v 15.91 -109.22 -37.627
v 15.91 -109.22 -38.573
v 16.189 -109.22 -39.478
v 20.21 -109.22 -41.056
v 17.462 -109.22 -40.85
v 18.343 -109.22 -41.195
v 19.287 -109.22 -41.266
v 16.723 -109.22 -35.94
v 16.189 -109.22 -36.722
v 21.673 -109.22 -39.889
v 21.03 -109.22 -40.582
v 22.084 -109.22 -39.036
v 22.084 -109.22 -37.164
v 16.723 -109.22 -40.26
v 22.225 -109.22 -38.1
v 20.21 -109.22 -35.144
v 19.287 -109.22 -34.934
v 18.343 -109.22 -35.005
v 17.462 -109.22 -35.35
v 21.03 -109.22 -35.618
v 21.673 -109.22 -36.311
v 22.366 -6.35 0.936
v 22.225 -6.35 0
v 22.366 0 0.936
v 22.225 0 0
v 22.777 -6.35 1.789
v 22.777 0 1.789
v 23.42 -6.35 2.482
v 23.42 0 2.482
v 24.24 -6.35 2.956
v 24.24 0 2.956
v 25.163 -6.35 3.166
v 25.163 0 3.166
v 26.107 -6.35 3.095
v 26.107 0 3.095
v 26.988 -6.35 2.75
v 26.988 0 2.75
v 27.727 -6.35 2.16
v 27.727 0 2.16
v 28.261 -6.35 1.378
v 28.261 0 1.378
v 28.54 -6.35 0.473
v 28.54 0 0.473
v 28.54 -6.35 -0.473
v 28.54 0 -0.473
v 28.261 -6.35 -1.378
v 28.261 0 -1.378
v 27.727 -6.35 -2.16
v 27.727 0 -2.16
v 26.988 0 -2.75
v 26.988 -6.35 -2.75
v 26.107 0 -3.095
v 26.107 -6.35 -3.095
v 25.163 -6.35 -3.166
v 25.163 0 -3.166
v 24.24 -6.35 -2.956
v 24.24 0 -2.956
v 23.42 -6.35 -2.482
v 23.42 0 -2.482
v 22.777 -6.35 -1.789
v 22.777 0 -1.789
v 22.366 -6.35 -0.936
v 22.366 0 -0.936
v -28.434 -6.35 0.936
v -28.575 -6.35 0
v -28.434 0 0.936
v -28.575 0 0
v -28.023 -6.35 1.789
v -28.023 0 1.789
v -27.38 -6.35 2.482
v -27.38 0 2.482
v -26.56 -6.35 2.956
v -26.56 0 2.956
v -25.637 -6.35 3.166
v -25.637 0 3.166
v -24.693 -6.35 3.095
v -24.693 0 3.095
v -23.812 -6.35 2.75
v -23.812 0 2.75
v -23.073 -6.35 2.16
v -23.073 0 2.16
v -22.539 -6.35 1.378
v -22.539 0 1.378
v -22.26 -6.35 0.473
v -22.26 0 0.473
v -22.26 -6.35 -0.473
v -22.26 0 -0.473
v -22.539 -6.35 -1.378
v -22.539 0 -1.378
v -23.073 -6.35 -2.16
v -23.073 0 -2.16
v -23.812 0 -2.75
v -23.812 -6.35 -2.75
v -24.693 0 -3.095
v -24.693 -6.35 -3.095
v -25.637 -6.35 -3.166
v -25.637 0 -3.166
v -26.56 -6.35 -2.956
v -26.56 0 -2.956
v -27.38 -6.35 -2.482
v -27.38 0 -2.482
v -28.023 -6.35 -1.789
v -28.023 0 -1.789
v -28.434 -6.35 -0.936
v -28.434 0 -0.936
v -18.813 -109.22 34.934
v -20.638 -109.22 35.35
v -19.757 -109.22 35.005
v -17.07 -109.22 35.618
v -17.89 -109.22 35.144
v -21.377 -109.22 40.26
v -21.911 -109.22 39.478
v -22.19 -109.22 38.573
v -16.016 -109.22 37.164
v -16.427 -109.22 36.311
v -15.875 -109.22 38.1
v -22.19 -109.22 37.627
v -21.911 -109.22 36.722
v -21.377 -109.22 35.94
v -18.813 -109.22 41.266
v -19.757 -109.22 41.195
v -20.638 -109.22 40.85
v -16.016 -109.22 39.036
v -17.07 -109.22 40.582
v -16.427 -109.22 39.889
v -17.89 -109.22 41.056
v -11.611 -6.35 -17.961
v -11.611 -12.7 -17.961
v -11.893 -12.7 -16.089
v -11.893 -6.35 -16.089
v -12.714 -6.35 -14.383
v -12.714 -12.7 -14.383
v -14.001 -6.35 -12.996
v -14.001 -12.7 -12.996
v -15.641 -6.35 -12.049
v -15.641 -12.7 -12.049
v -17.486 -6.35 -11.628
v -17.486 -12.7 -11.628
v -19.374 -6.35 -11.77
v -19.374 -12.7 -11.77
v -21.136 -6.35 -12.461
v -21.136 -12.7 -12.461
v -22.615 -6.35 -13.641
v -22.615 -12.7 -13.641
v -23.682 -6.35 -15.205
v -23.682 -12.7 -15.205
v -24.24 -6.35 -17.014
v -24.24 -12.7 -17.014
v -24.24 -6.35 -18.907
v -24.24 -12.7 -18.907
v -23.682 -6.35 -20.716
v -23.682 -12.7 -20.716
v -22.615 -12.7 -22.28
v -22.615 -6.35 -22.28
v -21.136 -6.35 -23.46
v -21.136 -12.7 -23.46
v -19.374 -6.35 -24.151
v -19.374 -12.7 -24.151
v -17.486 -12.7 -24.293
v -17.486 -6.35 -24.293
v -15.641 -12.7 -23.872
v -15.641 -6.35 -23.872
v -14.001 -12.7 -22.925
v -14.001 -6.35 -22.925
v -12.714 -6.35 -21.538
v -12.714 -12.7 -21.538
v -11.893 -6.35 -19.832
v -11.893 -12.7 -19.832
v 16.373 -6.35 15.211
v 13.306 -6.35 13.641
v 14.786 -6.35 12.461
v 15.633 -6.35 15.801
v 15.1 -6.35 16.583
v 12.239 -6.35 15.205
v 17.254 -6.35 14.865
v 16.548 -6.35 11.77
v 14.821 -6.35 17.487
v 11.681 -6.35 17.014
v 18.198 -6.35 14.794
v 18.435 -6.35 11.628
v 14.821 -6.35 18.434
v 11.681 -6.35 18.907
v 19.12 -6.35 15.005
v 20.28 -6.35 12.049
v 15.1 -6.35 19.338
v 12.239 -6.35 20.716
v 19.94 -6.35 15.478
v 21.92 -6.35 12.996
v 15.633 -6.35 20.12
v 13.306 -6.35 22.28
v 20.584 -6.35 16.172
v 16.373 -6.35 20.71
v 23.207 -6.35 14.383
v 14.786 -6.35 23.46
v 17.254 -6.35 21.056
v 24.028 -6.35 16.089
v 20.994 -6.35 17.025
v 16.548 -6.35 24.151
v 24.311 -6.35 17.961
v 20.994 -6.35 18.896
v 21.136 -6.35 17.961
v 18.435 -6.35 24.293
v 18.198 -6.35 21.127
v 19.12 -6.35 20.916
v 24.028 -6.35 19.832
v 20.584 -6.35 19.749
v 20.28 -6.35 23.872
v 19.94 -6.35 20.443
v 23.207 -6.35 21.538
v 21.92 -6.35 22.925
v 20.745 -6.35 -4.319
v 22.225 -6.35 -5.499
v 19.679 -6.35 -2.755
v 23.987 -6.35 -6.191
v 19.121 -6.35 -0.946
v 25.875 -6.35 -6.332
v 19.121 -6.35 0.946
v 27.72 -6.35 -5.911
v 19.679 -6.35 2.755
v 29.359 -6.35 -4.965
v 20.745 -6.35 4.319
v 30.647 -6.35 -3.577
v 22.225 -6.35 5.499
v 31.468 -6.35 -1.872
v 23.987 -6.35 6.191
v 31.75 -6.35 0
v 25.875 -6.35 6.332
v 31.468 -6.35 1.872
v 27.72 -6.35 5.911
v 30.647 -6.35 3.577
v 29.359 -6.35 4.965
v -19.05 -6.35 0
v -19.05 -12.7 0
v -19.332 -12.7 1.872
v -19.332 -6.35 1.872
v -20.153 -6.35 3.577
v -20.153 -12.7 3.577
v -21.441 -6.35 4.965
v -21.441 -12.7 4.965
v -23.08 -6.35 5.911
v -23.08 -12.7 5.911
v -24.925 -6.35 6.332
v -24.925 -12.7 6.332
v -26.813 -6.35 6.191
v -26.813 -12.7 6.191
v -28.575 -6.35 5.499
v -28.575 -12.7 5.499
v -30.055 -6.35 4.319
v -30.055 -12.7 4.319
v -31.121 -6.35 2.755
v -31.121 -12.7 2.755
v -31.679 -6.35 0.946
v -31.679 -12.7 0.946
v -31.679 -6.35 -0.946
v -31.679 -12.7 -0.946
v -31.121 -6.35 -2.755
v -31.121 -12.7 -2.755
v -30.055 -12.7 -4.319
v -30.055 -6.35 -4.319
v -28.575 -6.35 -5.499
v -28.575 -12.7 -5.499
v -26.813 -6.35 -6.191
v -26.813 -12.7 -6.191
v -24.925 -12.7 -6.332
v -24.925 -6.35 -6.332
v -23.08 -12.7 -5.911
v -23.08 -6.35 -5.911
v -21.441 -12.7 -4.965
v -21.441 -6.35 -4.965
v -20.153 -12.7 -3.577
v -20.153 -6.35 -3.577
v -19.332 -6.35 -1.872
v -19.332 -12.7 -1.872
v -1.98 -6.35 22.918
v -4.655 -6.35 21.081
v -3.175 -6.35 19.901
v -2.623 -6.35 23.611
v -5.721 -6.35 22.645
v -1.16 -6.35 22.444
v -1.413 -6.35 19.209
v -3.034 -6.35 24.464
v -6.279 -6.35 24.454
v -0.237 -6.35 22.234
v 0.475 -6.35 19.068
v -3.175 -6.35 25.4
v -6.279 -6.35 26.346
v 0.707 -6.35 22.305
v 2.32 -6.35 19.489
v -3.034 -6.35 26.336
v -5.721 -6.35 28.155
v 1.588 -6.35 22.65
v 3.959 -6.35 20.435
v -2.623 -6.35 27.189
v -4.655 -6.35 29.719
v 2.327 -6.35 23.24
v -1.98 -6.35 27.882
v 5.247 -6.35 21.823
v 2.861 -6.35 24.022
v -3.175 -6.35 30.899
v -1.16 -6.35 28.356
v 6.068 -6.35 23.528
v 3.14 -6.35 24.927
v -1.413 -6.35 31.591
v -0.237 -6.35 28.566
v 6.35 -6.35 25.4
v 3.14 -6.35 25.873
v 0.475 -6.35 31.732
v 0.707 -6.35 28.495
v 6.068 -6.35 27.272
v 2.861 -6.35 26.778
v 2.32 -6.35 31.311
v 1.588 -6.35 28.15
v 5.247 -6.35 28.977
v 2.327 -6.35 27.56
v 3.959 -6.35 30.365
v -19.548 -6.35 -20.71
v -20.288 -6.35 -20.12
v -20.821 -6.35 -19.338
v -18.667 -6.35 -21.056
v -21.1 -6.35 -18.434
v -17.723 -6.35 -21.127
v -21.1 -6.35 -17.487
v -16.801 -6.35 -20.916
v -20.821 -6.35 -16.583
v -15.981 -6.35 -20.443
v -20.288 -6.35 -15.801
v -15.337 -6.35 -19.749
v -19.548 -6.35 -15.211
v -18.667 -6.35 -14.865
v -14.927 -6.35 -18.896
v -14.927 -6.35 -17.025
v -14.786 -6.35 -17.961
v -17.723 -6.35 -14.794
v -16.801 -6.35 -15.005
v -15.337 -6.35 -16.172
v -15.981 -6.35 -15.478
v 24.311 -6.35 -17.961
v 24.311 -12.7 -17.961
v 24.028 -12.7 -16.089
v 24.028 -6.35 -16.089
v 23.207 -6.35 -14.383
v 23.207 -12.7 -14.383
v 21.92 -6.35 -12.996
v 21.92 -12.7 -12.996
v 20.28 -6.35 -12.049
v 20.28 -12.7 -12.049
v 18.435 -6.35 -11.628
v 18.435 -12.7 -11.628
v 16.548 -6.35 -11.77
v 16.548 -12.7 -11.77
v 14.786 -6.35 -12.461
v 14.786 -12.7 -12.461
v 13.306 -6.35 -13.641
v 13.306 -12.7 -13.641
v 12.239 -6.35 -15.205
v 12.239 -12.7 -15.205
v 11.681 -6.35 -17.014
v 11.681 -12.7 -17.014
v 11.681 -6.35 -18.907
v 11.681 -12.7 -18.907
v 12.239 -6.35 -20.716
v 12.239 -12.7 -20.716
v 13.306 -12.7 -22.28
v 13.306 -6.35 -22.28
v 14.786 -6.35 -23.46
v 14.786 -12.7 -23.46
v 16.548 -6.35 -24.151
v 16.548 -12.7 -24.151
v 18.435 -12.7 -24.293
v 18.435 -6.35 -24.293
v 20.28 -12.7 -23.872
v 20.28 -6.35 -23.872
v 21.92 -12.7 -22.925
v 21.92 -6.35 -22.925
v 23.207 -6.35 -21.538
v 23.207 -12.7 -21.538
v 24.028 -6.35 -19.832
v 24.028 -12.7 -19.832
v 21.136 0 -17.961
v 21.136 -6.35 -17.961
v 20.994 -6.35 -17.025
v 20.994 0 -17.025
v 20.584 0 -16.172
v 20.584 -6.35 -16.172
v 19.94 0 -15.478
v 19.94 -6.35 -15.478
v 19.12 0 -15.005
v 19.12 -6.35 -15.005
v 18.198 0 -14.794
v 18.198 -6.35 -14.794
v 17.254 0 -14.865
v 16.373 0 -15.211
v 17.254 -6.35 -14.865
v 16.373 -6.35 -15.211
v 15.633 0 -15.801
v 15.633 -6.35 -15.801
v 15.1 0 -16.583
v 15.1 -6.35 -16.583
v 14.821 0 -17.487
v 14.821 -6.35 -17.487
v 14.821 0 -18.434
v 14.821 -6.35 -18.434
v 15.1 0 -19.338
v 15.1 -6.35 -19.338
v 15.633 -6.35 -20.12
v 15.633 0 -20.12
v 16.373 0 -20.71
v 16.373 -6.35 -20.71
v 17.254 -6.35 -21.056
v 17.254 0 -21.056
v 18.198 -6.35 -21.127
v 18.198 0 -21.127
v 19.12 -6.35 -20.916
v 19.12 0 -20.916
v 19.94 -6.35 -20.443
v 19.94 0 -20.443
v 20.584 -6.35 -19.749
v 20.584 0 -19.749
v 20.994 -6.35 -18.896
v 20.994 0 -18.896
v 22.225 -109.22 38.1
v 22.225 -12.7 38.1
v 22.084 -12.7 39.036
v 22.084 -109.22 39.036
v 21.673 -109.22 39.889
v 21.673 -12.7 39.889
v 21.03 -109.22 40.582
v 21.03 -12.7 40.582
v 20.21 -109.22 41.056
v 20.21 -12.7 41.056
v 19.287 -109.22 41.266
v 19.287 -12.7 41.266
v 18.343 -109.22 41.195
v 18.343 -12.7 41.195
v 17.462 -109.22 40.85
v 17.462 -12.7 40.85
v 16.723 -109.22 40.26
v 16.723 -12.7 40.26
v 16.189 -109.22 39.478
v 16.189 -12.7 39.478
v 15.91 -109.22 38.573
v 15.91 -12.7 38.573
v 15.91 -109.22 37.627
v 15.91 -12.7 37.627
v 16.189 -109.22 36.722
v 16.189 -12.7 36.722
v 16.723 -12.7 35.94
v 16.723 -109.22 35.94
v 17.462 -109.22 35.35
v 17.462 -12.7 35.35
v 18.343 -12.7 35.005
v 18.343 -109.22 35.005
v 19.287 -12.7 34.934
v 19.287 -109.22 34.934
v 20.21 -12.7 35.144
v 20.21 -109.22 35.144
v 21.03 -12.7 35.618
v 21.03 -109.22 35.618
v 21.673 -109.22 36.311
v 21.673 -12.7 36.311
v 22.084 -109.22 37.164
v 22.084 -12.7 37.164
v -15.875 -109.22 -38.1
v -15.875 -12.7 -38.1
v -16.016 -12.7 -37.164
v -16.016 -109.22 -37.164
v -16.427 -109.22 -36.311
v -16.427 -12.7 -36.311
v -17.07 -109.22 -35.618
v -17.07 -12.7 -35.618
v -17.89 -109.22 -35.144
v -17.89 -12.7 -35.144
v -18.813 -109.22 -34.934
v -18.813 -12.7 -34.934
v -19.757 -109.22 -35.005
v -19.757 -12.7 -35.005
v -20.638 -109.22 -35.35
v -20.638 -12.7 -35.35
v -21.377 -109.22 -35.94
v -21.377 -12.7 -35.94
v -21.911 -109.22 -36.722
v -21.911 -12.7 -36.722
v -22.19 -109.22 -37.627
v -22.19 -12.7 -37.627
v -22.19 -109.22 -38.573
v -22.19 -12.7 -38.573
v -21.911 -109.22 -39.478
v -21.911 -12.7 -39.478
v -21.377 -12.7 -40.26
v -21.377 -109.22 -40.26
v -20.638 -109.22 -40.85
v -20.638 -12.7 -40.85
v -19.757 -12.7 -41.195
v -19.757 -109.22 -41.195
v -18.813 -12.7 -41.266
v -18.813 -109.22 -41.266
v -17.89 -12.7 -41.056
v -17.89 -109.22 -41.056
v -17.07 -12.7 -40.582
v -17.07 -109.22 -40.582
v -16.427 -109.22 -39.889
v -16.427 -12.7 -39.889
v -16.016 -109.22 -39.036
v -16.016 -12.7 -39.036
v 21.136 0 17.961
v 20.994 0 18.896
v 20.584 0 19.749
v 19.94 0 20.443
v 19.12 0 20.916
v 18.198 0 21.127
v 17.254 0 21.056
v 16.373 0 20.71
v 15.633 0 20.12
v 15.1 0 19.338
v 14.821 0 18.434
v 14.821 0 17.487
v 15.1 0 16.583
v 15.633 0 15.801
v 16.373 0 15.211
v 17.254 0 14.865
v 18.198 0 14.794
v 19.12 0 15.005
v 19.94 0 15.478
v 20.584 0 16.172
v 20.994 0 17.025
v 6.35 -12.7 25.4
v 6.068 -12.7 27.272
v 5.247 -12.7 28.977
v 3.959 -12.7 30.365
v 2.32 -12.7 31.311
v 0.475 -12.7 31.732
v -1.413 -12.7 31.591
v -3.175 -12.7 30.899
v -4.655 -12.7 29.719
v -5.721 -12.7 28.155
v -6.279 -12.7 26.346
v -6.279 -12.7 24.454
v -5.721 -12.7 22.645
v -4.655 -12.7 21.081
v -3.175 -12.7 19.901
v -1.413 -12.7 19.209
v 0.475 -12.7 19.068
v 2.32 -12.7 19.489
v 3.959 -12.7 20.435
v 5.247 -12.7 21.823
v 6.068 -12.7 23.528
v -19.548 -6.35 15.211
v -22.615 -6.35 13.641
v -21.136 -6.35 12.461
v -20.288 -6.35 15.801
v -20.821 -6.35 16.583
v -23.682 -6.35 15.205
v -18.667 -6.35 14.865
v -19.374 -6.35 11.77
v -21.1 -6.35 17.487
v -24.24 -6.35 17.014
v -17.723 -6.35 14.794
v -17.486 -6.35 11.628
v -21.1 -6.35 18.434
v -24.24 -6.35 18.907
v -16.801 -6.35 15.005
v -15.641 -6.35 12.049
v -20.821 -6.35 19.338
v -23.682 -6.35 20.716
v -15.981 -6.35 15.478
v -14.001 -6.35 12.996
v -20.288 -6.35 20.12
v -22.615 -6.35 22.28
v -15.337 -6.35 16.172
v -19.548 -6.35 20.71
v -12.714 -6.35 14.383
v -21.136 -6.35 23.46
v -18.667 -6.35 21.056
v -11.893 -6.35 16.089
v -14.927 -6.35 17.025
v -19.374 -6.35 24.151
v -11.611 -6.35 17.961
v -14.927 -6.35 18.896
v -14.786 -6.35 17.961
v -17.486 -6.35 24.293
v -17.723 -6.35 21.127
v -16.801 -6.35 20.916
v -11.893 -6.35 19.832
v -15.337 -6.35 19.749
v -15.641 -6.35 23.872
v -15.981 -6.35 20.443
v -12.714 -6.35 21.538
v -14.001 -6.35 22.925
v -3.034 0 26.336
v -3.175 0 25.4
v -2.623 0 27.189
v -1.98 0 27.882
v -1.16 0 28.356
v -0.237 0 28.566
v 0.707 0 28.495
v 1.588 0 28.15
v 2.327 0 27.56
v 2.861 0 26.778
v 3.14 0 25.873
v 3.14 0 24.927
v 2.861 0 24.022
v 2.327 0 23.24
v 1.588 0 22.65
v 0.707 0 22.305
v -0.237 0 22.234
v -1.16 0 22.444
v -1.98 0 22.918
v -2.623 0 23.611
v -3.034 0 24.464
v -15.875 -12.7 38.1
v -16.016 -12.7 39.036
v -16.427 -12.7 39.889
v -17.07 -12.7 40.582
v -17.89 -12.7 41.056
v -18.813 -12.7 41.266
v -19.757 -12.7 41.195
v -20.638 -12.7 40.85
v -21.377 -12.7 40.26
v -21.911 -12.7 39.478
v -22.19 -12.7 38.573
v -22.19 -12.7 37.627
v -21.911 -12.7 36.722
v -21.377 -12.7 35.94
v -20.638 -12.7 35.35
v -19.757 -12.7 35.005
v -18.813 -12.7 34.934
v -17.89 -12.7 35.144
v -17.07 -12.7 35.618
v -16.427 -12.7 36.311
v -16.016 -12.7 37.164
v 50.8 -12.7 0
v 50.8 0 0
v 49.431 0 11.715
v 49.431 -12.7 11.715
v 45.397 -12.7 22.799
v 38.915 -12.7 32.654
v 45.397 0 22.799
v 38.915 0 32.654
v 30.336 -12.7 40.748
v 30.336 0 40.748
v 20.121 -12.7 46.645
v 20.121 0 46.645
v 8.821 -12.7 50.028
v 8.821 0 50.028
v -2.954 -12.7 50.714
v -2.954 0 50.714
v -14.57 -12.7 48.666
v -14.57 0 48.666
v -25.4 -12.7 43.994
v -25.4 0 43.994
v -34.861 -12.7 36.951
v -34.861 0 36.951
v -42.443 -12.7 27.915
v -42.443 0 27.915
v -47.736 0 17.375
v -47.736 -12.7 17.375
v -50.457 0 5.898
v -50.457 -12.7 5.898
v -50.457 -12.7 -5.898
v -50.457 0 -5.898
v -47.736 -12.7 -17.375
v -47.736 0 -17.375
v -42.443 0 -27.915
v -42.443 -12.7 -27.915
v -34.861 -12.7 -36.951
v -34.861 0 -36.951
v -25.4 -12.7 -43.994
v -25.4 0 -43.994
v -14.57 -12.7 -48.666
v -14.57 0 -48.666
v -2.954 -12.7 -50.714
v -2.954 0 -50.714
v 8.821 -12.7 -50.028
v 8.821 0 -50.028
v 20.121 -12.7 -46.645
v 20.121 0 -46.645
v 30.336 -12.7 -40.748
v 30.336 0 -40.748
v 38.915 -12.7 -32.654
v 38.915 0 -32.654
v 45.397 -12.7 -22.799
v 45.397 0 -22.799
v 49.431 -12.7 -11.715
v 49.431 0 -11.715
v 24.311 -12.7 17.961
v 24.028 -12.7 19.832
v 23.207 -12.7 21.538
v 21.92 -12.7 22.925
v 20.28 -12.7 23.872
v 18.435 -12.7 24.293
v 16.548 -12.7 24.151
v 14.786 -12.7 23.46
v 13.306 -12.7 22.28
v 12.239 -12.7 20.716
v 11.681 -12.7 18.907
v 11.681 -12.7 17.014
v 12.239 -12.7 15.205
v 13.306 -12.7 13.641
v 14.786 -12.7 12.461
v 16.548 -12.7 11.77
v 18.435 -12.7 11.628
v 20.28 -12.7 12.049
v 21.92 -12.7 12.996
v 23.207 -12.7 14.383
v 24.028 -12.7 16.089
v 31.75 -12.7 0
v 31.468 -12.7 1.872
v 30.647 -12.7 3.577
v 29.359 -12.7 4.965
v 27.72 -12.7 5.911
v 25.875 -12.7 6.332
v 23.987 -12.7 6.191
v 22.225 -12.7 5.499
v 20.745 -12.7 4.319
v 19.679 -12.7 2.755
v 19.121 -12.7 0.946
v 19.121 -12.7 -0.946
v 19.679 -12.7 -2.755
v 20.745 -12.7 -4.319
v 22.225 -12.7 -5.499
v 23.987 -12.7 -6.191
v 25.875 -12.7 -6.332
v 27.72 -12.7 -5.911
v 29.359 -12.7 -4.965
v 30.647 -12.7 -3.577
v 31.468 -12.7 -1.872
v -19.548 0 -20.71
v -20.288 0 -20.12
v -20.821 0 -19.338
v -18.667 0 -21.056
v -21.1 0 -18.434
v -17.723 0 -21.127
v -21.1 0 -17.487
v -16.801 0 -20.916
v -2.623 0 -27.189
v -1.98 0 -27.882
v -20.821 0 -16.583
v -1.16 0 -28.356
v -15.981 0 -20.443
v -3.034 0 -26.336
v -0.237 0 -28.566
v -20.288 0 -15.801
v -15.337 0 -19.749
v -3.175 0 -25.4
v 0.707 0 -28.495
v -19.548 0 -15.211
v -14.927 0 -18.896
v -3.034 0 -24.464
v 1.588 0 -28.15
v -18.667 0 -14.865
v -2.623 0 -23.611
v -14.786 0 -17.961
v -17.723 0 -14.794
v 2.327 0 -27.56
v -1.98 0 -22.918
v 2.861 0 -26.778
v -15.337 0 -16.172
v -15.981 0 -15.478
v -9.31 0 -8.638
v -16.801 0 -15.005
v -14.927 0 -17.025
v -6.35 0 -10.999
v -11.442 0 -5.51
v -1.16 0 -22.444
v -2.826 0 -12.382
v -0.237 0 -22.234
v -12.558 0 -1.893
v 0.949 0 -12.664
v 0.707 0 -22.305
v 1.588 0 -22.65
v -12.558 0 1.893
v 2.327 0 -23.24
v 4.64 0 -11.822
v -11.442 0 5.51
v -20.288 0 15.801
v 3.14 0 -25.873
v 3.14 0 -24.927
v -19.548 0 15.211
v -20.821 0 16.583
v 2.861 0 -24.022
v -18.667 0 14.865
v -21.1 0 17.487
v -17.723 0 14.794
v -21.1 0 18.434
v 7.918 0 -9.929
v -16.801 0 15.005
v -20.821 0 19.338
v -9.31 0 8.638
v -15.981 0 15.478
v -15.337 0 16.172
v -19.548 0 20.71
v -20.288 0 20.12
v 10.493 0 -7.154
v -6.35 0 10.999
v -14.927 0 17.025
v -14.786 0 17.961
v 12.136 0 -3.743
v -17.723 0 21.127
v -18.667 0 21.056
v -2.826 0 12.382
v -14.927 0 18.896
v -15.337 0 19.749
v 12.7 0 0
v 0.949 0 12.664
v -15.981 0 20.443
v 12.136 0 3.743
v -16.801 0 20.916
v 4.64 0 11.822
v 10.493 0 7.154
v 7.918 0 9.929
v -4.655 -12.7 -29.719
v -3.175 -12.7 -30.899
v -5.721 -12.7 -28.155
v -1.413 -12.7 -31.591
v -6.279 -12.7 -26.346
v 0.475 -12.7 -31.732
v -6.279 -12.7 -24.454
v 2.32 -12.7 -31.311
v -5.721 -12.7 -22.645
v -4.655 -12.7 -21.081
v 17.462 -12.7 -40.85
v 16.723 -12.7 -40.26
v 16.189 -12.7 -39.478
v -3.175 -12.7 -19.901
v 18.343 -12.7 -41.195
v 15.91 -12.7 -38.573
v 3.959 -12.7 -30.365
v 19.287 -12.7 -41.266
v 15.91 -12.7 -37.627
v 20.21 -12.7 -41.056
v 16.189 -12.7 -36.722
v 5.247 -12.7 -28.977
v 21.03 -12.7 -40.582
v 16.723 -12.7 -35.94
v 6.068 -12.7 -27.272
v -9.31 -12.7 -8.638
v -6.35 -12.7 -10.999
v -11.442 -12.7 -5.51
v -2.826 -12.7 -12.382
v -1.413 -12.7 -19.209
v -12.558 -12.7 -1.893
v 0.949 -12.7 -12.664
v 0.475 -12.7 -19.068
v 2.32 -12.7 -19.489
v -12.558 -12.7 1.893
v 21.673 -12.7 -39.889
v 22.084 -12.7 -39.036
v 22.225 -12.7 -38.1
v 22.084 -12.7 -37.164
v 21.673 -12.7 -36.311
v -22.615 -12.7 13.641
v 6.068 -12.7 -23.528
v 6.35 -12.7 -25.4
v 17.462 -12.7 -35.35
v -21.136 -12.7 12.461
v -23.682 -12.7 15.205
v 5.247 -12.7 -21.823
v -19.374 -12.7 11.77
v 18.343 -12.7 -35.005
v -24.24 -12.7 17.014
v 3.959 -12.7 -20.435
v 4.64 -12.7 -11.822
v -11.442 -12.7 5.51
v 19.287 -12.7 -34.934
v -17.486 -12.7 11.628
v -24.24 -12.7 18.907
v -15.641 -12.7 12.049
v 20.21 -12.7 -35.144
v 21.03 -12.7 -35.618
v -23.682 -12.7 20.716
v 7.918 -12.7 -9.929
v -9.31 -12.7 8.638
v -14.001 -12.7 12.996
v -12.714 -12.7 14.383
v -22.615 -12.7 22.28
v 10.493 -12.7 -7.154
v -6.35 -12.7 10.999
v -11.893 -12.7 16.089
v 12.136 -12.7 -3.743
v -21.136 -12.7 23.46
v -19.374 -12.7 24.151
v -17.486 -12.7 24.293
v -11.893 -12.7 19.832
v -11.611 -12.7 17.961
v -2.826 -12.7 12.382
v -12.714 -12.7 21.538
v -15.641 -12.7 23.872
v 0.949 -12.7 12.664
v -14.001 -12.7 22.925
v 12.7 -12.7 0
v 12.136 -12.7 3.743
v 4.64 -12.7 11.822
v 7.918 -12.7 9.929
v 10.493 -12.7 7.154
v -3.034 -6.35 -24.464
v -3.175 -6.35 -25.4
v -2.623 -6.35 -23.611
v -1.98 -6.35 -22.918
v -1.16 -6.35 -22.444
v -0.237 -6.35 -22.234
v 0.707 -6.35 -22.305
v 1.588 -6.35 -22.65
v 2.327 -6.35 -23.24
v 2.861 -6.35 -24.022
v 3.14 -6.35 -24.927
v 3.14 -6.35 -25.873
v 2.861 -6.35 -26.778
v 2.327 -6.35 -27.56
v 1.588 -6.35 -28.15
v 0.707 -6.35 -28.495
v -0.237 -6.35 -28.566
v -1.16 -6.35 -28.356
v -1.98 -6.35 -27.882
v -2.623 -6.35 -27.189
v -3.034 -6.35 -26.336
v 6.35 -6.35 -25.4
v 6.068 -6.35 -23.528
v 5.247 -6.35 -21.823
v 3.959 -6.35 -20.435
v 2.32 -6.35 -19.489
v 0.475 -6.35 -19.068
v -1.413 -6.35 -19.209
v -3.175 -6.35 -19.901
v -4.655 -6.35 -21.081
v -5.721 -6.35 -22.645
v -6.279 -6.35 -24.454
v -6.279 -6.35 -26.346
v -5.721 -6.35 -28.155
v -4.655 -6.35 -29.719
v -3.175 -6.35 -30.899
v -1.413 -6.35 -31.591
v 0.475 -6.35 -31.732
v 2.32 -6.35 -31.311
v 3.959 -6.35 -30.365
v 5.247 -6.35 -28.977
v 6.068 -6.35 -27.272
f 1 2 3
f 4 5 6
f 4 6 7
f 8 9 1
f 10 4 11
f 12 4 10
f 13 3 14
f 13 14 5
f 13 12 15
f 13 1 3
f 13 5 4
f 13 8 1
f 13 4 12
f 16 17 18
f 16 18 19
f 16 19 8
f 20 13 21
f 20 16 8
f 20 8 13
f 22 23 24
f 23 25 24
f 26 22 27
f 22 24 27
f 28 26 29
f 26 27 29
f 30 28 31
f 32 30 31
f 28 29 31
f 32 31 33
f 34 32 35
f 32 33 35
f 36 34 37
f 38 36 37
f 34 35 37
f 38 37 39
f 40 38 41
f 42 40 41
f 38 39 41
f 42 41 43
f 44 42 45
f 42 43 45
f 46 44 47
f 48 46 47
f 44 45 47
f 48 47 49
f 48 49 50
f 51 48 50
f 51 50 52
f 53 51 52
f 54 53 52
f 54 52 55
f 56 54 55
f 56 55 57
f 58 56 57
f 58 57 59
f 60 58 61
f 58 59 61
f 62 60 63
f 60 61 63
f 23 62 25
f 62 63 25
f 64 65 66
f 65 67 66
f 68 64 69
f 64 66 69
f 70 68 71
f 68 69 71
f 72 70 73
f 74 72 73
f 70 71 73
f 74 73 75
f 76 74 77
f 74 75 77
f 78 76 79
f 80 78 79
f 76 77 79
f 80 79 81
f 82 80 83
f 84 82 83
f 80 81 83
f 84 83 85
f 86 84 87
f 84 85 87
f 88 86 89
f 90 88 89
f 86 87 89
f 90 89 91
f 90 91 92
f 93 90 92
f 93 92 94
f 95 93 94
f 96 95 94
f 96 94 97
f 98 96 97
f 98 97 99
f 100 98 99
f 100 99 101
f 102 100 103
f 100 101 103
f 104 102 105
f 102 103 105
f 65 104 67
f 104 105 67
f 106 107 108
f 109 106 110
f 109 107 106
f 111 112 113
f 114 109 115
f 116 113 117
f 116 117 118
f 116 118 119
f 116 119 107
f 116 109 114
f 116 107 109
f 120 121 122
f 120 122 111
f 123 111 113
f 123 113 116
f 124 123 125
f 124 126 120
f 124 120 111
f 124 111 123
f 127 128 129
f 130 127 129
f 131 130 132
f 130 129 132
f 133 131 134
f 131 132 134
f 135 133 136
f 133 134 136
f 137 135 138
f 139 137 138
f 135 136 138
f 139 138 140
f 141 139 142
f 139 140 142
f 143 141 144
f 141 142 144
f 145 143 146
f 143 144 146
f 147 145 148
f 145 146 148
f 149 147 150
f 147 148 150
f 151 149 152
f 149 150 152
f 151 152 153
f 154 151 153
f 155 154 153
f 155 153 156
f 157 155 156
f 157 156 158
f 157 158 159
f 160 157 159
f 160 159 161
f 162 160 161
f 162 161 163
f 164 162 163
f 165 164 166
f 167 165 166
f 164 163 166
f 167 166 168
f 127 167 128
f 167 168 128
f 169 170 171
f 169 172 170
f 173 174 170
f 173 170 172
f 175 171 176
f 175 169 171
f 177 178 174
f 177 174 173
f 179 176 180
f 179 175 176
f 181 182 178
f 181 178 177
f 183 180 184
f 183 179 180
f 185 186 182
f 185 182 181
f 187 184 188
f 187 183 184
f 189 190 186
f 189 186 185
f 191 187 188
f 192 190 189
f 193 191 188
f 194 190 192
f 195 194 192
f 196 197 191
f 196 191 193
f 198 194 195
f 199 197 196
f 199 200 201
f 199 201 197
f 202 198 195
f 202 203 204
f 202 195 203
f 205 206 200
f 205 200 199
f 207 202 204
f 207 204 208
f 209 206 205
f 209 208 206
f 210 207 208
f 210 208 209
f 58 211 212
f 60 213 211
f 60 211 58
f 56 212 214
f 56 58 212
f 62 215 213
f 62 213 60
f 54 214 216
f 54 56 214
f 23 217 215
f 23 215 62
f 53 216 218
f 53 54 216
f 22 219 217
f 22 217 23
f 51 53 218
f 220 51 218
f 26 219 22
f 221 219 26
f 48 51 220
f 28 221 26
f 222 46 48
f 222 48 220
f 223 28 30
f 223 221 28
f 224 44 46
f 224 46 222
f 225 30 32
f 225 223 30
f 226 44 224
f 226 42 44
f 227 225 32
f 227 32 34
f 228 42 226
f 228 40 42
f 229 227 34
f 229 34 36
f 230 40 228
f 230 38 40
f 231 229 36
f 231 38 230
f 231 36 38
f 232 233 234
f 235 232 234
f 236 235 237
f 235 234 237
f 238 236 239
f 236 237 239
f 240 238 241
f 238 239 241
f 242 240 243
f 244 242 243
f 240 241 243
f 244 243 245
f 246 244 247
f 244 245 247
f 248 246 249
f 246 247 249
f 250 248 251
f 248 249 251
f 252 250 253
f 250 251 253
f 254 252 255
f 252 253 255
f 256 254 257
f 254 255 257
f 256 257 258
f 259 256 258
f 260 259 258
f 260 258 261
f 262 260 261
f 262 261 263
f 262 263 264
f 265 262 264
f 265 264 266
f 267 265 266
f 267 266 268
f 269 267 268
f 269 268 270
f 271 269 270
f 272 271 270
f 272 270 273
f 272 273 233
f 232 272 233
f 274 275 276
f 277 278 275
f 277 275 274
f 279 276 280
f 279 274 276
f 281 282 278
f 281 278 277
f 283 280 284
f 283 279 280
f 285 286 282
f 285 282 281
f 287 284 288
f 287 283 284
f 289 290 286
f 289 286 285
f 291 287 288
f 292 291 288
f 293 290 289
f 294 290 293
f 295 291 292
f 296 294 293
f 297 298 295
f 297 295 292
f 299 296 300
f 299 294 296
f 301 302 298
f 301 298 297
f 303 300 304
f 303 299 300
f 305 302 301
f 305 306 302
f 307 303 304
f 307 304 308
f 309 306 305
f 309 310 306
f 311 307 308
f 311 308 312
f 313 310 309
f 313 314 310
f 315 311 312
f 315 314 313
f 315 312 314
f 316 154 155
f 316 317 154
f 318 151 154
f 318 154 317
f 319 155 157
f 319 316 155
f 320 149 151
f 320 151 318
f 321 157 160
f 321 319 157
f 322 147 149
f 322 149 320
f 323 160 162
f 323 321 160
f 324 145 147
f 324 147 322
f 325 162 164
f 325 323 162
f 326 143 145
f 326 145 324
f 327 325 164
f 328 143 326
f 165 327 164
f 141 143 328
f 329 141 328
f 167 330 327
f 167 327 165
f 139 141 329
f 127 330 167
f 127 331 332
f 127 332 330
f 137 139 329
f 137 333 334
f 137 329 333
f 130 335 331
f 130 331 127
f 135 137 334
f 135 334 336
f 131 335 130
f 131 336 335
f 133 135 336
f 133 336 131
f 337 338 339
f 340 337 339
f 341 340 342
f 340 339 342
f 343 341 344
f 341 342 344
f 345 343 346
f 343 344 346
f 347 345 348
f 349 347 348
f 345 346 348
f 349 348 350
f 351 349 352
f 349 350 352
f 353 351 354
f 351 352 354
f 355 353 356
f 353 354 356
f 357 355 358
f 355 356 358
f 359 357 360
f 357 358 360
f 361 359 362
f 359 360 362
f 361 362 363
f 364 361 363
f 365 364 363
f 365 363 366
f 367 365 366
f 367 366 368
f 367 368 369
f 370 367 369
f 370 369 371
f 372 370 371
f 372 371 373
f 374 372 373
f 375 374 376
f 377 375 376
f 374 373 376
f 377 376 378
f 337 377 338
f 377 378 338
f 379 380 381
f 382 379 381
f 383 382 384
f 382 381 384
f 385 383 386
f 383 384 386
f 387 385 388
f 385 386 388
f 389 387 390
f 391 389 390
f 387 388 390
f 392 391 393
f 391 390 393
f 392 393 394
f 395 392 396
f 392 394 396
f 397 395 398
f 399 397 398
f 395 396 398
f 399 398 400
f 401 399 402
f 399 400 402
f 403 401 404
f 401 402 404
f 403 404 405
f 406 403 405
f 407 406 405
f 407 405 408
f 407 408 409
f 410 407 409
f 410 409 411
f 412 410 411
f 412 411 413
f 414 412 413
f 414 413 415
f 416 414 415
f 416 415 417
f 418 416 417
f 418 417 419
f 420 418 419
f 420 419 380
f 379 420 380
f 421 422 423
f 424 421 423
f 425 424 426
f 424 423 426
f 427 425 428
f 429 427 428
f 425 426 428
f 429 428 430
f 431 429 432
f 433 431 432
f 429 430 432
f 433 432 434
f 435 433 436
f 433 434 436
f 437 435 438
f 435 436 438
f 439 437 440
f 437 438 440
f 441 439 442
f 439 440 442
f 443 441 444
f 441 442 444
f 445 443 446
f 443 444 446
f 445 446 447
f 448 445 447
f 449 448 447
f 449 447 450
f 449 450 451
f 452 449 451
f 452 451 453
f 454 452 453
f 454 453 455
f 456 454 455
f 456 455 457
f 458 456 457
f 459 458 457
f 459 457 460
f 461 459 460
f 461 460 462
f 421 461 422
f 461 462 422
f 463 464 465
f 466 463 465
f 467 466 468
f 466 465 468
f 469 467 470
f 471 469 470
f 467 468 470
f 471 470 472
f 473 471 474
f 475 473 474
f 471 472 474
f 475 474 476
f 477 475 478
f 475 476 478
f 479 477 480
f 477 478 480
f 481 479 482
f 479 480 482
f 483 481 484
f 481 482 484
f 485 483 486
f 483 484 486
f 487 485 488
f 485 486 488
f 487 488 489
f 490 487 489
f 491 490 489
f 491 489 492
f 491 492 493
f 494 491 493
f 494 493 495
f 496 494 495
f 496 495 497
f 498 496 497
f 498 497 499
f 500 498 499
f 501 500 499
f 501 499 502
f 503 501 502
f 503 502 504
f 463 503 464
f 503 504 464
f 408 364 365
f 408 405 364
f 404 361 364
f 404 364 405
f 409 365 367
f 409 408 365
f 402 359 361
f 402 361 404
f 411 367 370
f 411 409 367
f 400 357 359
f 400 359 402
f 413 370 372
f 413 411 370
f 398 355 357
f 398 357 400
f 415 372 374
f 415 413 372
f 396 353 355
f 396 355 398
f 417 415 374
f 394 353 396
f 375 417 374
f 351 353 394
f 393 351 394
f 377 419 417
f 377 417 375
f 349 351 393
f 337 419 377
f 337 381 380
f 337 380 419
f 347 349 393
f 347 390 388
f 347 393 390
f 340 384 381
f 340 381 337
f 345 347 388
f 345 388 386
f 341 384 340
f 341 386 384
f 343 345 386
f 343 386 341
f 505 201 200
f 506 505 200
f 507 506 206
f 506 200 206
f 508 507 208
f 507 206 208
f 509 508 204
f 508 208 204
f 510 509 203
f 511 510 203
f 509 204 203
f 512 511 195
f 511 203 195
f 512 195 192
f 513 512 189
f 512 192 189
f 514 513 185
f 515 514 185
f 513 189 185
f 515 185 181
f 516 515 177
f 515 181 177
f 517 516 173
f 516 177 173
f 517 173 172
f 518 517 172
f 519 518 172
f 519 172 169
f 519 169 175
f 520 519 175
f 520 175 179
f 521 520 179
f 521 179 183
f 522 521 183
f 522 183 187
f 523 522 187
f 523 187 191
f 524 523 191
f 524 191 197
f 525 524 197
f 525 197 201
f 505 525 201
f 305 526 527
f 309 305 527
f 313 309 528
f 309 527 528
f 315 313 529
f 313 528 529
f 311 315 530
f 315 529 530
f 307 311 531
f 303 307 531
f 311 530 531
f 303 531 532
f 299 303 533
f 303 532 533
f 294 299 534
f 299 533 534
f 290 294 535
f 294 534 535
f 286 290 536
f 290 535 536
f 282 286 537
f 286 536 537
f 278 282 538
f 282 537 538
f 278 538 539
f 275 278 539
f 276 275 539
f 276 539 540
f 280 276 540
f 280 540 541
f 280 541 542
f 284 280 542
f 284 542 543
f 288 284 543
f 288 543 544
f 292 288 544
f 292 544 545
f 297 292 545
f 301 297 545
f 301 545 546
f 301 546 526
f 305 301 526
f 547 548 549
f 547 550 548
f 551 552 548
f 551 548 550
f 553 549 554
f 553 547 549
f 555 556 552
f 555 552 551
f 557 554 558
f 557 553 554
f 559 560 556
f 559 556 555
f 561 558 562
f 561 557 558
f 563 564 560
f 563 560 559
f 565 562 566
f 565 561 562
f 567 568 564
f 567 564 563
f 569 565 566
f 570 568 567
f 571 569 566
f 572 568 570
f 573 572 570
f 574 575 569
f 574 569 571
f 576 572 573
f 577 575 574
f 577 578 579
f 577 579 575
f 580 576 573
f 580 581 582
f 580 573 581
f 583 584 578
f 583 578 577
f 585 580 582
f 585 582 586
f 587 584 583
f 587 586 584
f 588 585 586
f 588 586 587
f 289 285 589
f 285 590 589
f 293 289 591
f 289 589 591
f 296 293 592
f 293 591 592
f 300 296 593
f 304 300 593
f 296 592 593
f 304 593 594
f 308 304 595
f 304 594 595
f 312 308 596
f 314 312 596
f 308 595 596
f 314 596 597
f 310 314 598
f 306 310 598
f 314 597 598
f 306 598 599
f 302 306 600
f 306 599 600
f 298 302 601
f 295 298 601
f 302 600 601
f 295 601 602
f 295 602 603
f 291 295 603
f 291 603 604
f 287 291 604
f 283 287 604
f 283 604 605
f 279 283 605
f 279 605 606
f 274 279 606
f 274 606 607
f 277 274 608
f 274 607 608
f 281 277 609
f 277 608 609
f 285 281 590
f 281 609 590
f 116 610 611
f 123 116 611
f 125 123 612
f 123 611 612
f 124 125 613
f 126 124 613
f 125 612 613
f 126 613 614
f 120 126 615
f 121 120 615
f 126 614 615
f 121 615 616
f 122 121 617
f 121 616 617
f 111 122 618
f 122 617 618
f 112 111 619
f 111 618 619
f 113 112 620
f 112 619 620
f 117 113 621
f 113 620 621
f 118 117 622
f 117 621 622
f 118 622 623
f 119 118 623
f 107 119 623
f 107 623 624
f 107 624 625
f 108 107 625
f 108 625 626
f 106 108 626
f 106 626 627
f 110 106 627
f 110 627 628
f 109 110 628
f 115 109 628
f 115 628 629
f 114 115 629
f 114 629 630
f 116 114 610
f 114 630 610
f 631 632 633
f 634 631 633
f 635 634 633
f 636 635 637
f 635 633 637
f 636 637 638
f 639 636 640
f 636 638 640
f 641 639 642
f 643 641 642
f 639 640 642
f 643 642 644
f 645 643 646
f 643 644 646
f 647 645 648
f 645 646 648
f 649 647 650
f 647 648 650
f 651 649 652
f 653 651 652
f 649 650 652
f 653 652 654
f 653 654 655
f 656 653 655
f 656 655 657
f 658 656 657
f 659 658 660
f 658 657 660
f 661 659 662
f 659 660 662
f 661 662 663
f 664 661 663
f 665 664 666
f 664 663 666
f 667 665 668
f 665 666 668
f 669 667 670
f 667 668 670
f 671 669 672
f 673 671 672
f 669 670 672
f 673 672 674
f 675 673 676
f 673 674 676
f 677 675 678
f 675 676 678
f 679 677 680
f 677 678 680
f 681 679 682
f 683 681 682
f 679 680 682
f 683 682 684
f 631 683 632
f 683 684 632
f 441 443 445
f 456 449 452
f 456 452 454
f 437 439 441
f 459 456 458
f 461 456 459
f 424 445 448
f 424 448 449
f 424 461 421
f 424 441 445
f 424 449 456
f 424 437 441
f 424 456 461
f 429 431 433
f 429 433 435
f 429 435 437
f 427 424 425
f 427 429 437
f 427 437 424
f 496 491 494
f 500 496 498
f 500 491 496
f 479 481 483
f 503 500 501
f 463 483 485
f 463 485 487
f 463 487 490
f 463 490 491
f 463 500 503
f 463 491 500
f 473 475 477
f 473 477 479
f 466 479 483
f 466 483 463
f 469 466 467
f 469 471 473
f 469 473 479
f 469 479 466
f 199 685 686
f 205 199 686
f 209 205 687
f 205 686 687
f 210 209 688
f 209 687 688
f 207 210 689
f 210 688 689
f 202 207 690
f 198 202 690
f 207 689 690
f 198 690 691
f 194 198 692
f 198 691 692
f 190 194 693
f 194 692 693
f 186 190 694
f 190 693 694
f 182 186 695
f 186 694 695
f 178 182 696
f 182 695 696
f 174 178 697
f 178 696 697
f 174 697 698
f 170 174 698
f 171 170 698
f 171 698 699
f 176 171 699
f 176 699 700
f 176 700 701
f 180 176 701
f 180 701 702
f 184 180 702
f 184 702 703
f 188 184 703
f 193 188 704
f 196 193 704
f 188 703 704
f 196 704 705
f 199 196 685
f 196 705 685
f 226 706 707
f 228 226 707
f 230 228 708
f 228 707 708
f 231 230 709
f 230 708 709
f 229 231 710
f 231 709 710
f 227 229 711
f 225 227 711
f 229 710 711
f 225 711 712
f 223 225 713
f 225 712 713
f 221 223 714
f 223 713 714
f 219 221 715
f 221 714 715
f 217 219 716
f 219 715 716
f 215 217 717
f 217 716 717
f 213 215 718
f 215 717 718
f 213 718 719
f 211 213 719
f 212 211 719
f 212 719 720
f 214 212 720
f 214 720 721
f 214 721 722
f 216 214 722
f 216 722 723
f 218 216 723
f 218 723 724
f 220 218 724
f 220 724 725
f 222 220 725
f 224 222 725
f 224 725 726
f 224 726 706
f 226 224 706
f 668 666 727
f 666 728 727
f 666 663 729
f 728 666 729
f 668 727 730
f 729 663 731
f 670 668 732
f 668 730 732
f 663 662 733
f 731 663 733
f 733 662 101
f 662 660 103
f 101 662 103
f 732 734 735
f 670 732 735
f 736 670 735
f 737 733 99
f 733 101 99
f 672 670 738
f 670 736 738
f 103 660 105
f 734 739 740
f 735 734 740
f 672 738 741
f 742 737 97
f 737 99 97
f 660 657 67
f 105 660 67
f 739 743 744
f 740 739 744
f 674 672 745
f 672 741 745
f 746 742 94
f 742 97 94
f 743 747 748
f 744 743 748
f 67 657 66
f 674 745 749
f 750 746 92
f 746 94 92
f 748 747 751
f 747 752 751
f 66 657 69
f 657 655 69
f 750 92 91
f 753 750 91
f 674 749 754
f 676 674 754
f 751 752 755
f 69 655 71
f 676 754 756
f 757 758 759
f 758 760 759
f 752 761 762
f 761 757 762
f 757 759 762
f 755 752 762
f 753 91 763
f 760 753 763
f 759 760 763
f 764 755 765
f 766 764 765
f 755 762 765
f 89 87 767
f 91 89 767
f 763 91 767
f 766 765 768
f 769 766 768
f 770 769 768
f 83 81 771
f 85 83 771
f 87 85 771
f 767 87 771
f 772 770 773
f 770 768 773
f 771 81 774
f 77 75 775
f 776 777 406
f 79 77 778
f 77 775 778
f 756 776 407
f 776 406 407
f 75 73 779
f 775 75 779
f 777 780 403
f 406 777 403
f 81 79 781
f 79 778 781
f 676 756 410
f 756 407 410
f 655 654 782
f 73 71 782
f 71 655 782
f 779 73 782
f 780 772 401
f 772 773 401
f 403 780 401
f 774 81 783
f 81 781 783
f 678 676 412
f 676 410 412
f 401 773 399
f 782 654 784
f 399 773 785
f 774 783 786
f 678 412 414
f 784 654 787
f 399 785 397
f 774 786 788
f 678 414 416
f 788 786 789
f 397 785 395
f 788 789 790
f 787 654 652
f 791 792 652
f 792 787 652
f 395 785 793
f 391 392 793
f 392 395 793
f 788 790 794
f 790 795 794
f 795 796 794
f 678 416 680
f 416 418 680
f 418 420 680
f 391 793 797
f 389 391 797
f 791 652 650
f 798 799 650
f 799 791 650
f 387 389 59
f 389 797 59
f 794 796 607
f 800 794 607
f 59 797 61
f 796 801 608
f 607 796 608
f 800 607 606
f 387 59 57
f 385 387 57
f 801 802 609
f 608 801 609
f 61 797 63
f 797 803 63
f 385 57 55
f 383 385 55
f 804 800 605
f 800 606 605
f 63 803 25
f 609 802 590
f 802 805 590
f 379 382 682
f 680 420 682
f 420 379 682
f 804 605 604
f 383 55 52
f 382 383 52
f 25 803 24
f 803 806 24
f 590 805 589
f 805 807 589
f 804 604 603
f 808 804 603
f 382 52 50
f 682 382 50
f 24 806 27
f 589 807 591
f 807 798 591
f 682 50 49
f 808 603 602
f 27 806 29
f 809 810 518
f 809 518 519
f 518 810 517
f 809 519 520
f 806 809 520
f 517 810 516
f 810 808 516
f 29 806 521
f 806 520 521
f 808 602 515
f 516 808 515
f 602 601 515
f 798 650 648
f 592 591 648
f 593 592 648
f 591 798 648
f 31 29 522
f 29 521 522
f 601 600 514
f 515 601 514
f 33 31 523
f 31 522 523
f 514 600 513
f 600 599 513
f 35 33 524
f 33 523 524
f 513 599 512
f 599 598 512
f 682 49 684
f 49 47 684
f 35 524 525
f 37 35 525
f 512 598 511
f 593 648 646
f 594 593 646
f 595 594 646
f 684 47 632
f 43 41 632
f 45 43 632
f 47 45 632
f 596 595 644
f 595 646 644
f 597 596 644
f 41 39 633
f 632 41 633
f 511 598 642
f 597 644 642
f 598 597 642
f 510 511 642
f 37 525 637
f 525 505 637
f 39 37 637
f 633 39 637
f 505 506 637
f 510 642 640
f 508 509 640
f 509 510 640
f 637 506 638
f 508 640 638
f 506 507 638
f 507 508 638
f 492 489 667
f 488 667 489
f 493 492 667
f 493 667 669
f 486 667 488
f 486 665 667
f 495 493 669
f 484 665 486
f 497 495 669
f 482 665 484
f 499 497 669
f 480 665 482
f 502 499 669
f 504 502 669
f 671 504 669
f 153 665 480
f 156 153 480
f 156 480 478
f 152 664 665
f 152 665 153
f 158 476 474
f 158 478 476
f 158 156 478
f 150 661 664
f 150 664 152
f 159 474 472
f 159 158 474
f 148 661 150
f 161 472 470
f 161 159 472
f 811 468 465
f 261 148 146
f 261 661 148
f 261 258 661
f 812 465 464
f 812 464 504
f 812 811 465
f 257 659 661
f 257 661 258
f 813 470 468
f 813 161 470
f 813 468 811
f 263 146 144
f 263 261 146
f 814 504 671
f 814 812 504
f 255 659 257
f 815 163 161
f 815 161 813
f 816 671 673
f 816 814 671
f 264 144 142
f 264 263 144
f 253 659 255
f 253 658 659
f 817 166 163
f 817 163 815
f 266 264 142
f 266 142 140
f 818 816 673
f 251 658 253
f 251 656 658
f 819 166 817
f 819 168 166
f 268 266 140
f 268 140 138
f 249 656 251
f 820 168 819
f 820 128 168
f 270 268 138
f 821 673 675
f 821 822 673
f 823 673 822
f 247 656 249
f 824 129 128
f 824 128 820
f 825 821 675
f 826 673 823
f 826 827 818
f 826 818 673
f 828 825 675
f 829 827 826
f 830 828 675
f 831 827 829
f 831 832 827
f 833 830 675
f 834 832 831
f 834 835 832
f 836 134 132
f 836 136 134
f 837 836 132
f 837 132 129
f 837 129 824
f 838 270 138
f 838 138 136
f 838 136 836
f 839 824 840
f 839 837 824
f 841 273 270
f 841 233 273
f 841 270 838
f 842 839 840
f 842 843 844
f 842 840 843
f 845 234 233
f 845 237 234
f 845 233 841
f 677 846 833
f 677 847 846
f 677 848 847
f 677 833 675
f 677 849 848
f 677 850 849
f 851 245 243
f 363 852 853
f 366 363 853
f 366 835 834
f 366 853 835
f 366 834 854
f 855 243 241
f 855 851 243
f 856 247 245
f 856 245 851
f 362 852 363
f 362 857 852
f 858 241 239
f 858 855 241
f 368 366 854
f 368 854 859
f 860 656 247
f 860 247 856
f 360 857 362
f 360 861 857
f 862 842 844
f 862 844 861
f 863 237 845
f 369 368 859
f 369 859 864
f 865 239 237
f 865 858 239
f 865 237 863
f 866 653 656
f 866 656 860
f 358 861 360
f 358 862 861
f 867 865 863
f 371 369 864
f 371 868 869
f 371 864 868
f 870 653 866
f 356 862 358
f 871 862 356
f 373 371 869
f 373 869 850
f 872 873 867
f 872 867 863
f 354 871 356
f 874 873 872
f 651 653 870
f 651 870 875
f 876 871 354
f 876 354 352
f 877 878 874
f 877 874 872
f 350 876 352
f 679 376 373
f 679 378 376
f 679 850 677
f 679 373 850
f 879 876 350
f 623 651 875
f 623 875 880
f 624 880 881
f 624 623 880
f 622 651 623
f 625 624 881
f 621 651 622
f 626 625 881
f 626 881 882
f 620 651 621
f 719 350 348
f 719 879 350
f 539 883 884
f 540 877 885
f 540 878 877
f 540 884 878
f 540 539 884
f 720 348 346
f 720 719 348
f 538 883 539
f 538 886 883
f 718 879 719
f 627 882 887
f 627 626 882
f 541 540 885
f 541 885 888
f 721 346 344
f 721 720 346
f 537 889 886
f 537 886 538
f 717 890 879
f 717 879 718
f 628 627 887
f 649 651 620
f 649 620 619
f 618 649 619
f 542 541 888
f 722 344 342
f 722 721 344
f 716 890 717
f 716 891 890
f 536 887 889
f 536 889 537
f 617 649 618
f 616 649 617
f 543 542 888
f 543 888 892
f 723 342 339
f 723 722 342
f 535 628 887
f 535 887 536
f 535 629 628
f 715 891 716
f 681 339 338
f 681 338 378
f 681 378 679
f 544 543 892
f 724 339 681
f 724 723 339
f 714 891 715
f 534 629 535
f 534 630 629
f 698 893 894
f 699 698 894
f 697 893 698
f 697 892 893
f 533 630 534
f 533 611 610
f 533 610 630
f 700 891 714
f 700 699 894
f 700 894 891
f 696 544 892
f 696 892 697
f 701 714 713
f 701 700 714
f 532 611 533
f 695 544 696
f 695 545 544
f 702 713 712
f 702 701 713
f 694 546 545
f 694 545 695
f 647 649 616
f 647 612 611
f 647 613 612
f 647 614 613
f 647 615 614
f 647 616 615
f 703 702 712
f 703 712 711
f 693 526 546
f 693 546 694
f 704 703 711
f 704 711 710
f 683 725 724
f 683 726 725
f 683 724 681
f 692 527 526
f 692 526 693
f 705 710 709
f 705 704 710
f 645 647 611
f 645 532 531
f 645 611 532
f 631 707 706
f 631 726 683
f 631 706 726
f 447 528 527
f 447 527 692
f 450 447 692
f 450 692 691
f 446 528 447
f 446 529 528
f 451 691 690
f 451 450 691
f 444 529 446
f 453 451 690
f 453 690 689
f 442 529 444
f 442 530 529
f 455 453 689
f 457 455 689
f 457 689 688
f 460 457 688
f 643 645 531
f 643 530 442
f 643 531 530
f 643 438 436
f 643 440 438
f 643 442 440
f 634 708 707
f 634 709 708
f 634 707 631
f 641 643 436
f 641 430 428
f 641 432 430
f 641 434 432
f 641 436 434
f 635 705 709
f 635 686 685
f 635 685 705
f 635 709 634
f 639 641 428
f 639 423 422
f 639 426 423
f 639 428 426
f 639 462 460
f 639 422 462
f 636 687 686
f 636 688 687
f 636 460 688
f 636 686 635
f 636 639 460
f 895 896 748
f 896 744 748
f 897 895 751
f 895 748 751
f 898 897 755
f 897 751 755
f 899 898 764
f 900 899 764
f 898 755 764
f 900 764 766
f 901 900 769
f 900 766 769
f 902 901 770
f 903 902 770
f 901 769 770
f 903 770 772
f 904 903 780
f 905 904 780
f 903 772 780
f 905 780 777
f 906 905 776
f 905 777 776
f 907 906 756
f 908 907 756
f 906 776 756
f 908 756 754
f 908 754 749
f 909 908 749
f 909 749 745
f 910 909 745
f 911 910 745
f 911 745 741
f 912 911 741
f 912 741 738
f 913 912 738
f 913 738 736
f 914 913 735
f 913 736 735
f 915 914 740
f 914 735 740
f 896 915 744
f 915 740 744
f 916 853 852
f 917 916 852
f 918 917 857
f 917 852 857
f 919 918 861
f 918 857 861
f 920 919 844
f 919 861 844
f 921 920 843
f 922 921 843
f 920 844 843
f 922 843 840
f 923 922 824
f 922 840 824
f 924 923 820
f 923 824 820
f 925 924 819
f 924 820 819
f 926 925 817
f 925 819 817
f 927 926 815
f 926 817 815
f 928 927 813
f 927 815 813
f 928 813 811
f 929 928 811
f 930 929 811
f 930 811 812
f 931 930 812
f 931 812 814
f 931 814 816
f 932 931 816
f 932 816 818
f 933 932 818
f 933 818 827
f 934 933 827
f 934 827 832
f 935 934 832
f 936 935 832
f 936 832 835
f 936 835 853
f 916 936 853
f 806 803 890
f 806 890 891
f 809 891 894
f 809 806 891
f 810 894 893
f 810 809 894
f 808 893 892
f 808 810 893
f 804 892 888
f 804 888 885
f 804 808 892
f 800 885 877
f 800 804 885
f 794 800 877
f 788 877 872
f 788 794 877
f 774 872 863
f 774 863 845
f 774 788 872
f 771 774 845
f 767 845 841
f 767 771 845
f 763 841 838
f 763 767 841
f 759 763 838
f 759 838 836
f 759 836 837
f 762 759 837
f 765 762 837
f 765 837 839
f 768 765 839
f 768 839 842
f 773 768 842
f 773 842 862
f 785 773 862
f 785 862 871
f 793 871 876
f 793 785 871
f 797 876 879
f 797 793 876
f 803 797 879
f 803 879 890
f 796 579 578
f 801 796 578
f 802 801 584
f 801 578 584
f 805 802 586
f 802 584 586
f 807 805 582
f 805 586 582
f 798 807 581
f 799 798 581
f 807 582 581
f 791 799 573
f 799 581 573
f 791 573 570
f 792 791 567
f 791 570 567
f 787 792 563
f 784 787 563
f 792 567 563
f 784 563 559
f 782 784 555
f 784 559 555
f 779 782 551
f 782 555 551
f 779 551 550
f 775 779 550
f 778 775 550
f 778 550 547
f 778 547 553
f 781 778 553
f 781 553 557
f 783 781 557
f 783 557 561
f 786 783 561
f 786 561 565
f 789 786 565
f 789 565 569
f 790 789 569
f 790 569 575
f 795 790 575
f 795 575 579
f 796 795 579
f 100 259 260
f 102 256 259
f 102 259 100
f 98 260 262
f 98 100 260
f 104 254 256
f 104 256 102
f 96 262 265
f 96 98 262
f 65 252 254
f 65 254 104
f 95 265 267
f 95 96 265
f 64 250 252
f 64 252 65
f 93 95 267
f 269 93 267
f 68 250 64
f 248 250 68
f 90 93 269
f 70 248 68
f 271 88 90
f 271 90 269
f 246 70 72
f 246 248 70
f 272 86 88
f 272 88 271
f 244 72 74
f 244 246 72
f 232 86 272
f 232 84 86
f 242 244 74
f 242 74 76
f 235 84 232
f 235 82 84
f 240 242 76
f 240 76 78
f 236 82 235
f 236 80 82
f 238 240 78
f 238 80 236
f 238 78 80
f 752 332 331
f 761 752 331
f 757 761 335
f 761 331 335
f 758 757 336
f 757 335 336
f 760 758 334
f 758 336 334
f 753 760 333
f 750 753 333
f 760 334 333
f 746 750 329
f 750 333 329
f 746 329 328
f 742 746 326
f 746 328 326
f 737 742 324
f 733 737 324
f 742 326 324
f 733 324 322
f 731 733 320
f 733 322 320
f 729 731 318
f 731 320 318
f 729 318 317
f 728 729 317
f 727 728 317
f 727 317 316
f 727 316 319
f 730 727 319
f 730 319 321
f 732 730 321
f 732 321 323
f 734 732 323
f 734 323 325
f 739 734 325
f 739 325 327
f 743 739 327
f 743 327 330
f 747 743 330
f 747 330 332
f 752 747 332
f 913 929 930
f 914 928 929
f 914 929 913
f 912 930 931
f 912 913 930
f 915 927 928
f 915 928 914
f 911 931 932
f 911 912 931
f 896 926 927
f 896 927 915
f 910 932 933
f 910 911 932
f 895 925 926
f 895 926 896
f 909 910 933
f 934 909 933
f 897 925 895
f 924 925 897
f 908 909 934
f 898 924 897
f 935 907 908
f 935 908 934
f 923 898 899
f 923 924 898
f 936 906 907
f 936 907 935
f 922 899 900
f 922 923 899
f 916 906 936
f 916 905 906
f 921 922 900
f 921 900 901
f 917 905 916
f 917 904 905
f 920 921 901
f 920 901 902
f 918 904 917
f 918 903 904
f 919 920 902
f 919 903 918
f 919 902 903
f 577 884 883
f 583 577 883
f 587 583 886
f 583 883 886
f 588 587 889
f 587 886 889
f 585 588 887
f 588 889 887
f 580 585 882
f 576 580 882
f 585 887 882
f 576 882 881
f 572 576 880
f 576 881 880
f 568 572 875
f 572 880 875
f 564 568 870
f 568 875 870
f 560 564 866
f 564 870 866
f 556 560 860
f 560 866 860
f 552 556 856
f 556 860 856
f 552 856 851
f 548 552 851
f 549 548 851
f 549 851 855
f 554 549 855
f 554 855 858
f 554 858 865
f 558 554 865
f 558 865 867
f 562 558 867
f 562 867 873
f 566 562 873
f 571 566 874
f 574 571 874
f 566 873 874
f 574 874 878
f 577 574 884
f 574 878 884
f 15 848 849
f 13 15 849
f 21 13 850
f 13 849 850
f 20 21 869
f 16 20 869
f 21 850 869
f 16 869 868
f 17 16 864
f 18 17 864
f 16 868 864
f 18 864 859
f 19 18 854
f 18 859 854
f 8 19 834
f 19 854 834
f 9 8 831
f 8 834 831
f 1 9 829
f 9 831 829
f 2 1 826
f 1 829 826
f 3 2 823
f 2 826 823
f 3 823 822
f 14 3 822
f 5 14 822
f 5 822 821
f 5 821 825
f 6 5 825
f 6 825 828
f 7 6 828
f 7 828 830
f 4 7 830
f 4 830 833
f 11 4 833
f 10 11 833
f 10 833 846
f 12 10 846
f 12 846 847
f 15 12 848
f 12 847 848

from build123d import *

# Parameters (mm, degrees)
F0_R           = 50.8
F0_R_2         = 12.7
F1_DEPTH       = 12.7
F2_R           = 6.35
F3_DEPTH       = 6.35
F4_D           = 6.35
F4_CBORE_D     = 12.7
F4_CBORE_DEPTH = 6.35
F5_R           = 3.175
F6_DEPTH       = 96.52
F7_R           = 3.175
F8_DEPTH       = 25.4


with BuildPart() as f1:
    # F0 (on Front) → F1 (new body)
    with BuildSketch(Plane.XZ):
        Circle(F0_R)
        Circle(F0_R_2, mode=Mode.SUBTRACT)
    extrude(amount=F1_DEPTH)

    # F2 (on face) → F3 (cut)
    with BuildSketch(Plane.XZ.offset(12.7)):
        with Locations((-17.960512, 17.960512)):
            Circle(F2_R)
        with Locations((17.960512, 17.960512)):
            Circle(F2_R)
        with Locations((17.960512, -17.960512)):
            Circle(F2_R)
        with Locations((-17.960512, -17.960512)):
            Circle(F2_R)
    extrude(amount=-F3_DEPTH, mode=Mode.SUBTRACT)

    # F4 (through all)
    with Locations(Plane.XZ.offset(12.7)):
        with Locations((0, 25.4), (-25.4, 0), (0, -25.4), (25.4, 0)):
            CounterBoreHole(F4_D / 2, F4_CBORE_D / 2, F4_CBORE_DEPTH)

    # F5 (on face) → F6 (join)
    with BuildSketch(Plane.XZ.offset(12.7)):
        with Locations((-19.05, 38.1)):
            Circle(F5_R)
        with Locations((19.05, 38.1)):
            Circle(F5_R)
        with Locations((19.05, -38.1)):
            Circle(F5_R)
        with Locations((-19.05, -38.1)):
            Circle(F5_R)
    extrude(amount=F6_DEPTH)

    # F7 (on face) → F8 (cut)
    with BuildSketch(Plane.XZ.offset(6.35)):
        with Locations((-17.960512, 17.960512)):
            Circle(F7_R)
        with Locations((-17.960512, -17.960512)):
            Circle(F7_R)
        with Locations((17.960512, 17.960512)):
            Circle(F7_R)
        with Locations((17.960512, -17.960512)):
            Circle(F7_R)
    extrude(amount=-F8_DEPTH, mode=Mode.SUBTRACT)


solid = f1.part
